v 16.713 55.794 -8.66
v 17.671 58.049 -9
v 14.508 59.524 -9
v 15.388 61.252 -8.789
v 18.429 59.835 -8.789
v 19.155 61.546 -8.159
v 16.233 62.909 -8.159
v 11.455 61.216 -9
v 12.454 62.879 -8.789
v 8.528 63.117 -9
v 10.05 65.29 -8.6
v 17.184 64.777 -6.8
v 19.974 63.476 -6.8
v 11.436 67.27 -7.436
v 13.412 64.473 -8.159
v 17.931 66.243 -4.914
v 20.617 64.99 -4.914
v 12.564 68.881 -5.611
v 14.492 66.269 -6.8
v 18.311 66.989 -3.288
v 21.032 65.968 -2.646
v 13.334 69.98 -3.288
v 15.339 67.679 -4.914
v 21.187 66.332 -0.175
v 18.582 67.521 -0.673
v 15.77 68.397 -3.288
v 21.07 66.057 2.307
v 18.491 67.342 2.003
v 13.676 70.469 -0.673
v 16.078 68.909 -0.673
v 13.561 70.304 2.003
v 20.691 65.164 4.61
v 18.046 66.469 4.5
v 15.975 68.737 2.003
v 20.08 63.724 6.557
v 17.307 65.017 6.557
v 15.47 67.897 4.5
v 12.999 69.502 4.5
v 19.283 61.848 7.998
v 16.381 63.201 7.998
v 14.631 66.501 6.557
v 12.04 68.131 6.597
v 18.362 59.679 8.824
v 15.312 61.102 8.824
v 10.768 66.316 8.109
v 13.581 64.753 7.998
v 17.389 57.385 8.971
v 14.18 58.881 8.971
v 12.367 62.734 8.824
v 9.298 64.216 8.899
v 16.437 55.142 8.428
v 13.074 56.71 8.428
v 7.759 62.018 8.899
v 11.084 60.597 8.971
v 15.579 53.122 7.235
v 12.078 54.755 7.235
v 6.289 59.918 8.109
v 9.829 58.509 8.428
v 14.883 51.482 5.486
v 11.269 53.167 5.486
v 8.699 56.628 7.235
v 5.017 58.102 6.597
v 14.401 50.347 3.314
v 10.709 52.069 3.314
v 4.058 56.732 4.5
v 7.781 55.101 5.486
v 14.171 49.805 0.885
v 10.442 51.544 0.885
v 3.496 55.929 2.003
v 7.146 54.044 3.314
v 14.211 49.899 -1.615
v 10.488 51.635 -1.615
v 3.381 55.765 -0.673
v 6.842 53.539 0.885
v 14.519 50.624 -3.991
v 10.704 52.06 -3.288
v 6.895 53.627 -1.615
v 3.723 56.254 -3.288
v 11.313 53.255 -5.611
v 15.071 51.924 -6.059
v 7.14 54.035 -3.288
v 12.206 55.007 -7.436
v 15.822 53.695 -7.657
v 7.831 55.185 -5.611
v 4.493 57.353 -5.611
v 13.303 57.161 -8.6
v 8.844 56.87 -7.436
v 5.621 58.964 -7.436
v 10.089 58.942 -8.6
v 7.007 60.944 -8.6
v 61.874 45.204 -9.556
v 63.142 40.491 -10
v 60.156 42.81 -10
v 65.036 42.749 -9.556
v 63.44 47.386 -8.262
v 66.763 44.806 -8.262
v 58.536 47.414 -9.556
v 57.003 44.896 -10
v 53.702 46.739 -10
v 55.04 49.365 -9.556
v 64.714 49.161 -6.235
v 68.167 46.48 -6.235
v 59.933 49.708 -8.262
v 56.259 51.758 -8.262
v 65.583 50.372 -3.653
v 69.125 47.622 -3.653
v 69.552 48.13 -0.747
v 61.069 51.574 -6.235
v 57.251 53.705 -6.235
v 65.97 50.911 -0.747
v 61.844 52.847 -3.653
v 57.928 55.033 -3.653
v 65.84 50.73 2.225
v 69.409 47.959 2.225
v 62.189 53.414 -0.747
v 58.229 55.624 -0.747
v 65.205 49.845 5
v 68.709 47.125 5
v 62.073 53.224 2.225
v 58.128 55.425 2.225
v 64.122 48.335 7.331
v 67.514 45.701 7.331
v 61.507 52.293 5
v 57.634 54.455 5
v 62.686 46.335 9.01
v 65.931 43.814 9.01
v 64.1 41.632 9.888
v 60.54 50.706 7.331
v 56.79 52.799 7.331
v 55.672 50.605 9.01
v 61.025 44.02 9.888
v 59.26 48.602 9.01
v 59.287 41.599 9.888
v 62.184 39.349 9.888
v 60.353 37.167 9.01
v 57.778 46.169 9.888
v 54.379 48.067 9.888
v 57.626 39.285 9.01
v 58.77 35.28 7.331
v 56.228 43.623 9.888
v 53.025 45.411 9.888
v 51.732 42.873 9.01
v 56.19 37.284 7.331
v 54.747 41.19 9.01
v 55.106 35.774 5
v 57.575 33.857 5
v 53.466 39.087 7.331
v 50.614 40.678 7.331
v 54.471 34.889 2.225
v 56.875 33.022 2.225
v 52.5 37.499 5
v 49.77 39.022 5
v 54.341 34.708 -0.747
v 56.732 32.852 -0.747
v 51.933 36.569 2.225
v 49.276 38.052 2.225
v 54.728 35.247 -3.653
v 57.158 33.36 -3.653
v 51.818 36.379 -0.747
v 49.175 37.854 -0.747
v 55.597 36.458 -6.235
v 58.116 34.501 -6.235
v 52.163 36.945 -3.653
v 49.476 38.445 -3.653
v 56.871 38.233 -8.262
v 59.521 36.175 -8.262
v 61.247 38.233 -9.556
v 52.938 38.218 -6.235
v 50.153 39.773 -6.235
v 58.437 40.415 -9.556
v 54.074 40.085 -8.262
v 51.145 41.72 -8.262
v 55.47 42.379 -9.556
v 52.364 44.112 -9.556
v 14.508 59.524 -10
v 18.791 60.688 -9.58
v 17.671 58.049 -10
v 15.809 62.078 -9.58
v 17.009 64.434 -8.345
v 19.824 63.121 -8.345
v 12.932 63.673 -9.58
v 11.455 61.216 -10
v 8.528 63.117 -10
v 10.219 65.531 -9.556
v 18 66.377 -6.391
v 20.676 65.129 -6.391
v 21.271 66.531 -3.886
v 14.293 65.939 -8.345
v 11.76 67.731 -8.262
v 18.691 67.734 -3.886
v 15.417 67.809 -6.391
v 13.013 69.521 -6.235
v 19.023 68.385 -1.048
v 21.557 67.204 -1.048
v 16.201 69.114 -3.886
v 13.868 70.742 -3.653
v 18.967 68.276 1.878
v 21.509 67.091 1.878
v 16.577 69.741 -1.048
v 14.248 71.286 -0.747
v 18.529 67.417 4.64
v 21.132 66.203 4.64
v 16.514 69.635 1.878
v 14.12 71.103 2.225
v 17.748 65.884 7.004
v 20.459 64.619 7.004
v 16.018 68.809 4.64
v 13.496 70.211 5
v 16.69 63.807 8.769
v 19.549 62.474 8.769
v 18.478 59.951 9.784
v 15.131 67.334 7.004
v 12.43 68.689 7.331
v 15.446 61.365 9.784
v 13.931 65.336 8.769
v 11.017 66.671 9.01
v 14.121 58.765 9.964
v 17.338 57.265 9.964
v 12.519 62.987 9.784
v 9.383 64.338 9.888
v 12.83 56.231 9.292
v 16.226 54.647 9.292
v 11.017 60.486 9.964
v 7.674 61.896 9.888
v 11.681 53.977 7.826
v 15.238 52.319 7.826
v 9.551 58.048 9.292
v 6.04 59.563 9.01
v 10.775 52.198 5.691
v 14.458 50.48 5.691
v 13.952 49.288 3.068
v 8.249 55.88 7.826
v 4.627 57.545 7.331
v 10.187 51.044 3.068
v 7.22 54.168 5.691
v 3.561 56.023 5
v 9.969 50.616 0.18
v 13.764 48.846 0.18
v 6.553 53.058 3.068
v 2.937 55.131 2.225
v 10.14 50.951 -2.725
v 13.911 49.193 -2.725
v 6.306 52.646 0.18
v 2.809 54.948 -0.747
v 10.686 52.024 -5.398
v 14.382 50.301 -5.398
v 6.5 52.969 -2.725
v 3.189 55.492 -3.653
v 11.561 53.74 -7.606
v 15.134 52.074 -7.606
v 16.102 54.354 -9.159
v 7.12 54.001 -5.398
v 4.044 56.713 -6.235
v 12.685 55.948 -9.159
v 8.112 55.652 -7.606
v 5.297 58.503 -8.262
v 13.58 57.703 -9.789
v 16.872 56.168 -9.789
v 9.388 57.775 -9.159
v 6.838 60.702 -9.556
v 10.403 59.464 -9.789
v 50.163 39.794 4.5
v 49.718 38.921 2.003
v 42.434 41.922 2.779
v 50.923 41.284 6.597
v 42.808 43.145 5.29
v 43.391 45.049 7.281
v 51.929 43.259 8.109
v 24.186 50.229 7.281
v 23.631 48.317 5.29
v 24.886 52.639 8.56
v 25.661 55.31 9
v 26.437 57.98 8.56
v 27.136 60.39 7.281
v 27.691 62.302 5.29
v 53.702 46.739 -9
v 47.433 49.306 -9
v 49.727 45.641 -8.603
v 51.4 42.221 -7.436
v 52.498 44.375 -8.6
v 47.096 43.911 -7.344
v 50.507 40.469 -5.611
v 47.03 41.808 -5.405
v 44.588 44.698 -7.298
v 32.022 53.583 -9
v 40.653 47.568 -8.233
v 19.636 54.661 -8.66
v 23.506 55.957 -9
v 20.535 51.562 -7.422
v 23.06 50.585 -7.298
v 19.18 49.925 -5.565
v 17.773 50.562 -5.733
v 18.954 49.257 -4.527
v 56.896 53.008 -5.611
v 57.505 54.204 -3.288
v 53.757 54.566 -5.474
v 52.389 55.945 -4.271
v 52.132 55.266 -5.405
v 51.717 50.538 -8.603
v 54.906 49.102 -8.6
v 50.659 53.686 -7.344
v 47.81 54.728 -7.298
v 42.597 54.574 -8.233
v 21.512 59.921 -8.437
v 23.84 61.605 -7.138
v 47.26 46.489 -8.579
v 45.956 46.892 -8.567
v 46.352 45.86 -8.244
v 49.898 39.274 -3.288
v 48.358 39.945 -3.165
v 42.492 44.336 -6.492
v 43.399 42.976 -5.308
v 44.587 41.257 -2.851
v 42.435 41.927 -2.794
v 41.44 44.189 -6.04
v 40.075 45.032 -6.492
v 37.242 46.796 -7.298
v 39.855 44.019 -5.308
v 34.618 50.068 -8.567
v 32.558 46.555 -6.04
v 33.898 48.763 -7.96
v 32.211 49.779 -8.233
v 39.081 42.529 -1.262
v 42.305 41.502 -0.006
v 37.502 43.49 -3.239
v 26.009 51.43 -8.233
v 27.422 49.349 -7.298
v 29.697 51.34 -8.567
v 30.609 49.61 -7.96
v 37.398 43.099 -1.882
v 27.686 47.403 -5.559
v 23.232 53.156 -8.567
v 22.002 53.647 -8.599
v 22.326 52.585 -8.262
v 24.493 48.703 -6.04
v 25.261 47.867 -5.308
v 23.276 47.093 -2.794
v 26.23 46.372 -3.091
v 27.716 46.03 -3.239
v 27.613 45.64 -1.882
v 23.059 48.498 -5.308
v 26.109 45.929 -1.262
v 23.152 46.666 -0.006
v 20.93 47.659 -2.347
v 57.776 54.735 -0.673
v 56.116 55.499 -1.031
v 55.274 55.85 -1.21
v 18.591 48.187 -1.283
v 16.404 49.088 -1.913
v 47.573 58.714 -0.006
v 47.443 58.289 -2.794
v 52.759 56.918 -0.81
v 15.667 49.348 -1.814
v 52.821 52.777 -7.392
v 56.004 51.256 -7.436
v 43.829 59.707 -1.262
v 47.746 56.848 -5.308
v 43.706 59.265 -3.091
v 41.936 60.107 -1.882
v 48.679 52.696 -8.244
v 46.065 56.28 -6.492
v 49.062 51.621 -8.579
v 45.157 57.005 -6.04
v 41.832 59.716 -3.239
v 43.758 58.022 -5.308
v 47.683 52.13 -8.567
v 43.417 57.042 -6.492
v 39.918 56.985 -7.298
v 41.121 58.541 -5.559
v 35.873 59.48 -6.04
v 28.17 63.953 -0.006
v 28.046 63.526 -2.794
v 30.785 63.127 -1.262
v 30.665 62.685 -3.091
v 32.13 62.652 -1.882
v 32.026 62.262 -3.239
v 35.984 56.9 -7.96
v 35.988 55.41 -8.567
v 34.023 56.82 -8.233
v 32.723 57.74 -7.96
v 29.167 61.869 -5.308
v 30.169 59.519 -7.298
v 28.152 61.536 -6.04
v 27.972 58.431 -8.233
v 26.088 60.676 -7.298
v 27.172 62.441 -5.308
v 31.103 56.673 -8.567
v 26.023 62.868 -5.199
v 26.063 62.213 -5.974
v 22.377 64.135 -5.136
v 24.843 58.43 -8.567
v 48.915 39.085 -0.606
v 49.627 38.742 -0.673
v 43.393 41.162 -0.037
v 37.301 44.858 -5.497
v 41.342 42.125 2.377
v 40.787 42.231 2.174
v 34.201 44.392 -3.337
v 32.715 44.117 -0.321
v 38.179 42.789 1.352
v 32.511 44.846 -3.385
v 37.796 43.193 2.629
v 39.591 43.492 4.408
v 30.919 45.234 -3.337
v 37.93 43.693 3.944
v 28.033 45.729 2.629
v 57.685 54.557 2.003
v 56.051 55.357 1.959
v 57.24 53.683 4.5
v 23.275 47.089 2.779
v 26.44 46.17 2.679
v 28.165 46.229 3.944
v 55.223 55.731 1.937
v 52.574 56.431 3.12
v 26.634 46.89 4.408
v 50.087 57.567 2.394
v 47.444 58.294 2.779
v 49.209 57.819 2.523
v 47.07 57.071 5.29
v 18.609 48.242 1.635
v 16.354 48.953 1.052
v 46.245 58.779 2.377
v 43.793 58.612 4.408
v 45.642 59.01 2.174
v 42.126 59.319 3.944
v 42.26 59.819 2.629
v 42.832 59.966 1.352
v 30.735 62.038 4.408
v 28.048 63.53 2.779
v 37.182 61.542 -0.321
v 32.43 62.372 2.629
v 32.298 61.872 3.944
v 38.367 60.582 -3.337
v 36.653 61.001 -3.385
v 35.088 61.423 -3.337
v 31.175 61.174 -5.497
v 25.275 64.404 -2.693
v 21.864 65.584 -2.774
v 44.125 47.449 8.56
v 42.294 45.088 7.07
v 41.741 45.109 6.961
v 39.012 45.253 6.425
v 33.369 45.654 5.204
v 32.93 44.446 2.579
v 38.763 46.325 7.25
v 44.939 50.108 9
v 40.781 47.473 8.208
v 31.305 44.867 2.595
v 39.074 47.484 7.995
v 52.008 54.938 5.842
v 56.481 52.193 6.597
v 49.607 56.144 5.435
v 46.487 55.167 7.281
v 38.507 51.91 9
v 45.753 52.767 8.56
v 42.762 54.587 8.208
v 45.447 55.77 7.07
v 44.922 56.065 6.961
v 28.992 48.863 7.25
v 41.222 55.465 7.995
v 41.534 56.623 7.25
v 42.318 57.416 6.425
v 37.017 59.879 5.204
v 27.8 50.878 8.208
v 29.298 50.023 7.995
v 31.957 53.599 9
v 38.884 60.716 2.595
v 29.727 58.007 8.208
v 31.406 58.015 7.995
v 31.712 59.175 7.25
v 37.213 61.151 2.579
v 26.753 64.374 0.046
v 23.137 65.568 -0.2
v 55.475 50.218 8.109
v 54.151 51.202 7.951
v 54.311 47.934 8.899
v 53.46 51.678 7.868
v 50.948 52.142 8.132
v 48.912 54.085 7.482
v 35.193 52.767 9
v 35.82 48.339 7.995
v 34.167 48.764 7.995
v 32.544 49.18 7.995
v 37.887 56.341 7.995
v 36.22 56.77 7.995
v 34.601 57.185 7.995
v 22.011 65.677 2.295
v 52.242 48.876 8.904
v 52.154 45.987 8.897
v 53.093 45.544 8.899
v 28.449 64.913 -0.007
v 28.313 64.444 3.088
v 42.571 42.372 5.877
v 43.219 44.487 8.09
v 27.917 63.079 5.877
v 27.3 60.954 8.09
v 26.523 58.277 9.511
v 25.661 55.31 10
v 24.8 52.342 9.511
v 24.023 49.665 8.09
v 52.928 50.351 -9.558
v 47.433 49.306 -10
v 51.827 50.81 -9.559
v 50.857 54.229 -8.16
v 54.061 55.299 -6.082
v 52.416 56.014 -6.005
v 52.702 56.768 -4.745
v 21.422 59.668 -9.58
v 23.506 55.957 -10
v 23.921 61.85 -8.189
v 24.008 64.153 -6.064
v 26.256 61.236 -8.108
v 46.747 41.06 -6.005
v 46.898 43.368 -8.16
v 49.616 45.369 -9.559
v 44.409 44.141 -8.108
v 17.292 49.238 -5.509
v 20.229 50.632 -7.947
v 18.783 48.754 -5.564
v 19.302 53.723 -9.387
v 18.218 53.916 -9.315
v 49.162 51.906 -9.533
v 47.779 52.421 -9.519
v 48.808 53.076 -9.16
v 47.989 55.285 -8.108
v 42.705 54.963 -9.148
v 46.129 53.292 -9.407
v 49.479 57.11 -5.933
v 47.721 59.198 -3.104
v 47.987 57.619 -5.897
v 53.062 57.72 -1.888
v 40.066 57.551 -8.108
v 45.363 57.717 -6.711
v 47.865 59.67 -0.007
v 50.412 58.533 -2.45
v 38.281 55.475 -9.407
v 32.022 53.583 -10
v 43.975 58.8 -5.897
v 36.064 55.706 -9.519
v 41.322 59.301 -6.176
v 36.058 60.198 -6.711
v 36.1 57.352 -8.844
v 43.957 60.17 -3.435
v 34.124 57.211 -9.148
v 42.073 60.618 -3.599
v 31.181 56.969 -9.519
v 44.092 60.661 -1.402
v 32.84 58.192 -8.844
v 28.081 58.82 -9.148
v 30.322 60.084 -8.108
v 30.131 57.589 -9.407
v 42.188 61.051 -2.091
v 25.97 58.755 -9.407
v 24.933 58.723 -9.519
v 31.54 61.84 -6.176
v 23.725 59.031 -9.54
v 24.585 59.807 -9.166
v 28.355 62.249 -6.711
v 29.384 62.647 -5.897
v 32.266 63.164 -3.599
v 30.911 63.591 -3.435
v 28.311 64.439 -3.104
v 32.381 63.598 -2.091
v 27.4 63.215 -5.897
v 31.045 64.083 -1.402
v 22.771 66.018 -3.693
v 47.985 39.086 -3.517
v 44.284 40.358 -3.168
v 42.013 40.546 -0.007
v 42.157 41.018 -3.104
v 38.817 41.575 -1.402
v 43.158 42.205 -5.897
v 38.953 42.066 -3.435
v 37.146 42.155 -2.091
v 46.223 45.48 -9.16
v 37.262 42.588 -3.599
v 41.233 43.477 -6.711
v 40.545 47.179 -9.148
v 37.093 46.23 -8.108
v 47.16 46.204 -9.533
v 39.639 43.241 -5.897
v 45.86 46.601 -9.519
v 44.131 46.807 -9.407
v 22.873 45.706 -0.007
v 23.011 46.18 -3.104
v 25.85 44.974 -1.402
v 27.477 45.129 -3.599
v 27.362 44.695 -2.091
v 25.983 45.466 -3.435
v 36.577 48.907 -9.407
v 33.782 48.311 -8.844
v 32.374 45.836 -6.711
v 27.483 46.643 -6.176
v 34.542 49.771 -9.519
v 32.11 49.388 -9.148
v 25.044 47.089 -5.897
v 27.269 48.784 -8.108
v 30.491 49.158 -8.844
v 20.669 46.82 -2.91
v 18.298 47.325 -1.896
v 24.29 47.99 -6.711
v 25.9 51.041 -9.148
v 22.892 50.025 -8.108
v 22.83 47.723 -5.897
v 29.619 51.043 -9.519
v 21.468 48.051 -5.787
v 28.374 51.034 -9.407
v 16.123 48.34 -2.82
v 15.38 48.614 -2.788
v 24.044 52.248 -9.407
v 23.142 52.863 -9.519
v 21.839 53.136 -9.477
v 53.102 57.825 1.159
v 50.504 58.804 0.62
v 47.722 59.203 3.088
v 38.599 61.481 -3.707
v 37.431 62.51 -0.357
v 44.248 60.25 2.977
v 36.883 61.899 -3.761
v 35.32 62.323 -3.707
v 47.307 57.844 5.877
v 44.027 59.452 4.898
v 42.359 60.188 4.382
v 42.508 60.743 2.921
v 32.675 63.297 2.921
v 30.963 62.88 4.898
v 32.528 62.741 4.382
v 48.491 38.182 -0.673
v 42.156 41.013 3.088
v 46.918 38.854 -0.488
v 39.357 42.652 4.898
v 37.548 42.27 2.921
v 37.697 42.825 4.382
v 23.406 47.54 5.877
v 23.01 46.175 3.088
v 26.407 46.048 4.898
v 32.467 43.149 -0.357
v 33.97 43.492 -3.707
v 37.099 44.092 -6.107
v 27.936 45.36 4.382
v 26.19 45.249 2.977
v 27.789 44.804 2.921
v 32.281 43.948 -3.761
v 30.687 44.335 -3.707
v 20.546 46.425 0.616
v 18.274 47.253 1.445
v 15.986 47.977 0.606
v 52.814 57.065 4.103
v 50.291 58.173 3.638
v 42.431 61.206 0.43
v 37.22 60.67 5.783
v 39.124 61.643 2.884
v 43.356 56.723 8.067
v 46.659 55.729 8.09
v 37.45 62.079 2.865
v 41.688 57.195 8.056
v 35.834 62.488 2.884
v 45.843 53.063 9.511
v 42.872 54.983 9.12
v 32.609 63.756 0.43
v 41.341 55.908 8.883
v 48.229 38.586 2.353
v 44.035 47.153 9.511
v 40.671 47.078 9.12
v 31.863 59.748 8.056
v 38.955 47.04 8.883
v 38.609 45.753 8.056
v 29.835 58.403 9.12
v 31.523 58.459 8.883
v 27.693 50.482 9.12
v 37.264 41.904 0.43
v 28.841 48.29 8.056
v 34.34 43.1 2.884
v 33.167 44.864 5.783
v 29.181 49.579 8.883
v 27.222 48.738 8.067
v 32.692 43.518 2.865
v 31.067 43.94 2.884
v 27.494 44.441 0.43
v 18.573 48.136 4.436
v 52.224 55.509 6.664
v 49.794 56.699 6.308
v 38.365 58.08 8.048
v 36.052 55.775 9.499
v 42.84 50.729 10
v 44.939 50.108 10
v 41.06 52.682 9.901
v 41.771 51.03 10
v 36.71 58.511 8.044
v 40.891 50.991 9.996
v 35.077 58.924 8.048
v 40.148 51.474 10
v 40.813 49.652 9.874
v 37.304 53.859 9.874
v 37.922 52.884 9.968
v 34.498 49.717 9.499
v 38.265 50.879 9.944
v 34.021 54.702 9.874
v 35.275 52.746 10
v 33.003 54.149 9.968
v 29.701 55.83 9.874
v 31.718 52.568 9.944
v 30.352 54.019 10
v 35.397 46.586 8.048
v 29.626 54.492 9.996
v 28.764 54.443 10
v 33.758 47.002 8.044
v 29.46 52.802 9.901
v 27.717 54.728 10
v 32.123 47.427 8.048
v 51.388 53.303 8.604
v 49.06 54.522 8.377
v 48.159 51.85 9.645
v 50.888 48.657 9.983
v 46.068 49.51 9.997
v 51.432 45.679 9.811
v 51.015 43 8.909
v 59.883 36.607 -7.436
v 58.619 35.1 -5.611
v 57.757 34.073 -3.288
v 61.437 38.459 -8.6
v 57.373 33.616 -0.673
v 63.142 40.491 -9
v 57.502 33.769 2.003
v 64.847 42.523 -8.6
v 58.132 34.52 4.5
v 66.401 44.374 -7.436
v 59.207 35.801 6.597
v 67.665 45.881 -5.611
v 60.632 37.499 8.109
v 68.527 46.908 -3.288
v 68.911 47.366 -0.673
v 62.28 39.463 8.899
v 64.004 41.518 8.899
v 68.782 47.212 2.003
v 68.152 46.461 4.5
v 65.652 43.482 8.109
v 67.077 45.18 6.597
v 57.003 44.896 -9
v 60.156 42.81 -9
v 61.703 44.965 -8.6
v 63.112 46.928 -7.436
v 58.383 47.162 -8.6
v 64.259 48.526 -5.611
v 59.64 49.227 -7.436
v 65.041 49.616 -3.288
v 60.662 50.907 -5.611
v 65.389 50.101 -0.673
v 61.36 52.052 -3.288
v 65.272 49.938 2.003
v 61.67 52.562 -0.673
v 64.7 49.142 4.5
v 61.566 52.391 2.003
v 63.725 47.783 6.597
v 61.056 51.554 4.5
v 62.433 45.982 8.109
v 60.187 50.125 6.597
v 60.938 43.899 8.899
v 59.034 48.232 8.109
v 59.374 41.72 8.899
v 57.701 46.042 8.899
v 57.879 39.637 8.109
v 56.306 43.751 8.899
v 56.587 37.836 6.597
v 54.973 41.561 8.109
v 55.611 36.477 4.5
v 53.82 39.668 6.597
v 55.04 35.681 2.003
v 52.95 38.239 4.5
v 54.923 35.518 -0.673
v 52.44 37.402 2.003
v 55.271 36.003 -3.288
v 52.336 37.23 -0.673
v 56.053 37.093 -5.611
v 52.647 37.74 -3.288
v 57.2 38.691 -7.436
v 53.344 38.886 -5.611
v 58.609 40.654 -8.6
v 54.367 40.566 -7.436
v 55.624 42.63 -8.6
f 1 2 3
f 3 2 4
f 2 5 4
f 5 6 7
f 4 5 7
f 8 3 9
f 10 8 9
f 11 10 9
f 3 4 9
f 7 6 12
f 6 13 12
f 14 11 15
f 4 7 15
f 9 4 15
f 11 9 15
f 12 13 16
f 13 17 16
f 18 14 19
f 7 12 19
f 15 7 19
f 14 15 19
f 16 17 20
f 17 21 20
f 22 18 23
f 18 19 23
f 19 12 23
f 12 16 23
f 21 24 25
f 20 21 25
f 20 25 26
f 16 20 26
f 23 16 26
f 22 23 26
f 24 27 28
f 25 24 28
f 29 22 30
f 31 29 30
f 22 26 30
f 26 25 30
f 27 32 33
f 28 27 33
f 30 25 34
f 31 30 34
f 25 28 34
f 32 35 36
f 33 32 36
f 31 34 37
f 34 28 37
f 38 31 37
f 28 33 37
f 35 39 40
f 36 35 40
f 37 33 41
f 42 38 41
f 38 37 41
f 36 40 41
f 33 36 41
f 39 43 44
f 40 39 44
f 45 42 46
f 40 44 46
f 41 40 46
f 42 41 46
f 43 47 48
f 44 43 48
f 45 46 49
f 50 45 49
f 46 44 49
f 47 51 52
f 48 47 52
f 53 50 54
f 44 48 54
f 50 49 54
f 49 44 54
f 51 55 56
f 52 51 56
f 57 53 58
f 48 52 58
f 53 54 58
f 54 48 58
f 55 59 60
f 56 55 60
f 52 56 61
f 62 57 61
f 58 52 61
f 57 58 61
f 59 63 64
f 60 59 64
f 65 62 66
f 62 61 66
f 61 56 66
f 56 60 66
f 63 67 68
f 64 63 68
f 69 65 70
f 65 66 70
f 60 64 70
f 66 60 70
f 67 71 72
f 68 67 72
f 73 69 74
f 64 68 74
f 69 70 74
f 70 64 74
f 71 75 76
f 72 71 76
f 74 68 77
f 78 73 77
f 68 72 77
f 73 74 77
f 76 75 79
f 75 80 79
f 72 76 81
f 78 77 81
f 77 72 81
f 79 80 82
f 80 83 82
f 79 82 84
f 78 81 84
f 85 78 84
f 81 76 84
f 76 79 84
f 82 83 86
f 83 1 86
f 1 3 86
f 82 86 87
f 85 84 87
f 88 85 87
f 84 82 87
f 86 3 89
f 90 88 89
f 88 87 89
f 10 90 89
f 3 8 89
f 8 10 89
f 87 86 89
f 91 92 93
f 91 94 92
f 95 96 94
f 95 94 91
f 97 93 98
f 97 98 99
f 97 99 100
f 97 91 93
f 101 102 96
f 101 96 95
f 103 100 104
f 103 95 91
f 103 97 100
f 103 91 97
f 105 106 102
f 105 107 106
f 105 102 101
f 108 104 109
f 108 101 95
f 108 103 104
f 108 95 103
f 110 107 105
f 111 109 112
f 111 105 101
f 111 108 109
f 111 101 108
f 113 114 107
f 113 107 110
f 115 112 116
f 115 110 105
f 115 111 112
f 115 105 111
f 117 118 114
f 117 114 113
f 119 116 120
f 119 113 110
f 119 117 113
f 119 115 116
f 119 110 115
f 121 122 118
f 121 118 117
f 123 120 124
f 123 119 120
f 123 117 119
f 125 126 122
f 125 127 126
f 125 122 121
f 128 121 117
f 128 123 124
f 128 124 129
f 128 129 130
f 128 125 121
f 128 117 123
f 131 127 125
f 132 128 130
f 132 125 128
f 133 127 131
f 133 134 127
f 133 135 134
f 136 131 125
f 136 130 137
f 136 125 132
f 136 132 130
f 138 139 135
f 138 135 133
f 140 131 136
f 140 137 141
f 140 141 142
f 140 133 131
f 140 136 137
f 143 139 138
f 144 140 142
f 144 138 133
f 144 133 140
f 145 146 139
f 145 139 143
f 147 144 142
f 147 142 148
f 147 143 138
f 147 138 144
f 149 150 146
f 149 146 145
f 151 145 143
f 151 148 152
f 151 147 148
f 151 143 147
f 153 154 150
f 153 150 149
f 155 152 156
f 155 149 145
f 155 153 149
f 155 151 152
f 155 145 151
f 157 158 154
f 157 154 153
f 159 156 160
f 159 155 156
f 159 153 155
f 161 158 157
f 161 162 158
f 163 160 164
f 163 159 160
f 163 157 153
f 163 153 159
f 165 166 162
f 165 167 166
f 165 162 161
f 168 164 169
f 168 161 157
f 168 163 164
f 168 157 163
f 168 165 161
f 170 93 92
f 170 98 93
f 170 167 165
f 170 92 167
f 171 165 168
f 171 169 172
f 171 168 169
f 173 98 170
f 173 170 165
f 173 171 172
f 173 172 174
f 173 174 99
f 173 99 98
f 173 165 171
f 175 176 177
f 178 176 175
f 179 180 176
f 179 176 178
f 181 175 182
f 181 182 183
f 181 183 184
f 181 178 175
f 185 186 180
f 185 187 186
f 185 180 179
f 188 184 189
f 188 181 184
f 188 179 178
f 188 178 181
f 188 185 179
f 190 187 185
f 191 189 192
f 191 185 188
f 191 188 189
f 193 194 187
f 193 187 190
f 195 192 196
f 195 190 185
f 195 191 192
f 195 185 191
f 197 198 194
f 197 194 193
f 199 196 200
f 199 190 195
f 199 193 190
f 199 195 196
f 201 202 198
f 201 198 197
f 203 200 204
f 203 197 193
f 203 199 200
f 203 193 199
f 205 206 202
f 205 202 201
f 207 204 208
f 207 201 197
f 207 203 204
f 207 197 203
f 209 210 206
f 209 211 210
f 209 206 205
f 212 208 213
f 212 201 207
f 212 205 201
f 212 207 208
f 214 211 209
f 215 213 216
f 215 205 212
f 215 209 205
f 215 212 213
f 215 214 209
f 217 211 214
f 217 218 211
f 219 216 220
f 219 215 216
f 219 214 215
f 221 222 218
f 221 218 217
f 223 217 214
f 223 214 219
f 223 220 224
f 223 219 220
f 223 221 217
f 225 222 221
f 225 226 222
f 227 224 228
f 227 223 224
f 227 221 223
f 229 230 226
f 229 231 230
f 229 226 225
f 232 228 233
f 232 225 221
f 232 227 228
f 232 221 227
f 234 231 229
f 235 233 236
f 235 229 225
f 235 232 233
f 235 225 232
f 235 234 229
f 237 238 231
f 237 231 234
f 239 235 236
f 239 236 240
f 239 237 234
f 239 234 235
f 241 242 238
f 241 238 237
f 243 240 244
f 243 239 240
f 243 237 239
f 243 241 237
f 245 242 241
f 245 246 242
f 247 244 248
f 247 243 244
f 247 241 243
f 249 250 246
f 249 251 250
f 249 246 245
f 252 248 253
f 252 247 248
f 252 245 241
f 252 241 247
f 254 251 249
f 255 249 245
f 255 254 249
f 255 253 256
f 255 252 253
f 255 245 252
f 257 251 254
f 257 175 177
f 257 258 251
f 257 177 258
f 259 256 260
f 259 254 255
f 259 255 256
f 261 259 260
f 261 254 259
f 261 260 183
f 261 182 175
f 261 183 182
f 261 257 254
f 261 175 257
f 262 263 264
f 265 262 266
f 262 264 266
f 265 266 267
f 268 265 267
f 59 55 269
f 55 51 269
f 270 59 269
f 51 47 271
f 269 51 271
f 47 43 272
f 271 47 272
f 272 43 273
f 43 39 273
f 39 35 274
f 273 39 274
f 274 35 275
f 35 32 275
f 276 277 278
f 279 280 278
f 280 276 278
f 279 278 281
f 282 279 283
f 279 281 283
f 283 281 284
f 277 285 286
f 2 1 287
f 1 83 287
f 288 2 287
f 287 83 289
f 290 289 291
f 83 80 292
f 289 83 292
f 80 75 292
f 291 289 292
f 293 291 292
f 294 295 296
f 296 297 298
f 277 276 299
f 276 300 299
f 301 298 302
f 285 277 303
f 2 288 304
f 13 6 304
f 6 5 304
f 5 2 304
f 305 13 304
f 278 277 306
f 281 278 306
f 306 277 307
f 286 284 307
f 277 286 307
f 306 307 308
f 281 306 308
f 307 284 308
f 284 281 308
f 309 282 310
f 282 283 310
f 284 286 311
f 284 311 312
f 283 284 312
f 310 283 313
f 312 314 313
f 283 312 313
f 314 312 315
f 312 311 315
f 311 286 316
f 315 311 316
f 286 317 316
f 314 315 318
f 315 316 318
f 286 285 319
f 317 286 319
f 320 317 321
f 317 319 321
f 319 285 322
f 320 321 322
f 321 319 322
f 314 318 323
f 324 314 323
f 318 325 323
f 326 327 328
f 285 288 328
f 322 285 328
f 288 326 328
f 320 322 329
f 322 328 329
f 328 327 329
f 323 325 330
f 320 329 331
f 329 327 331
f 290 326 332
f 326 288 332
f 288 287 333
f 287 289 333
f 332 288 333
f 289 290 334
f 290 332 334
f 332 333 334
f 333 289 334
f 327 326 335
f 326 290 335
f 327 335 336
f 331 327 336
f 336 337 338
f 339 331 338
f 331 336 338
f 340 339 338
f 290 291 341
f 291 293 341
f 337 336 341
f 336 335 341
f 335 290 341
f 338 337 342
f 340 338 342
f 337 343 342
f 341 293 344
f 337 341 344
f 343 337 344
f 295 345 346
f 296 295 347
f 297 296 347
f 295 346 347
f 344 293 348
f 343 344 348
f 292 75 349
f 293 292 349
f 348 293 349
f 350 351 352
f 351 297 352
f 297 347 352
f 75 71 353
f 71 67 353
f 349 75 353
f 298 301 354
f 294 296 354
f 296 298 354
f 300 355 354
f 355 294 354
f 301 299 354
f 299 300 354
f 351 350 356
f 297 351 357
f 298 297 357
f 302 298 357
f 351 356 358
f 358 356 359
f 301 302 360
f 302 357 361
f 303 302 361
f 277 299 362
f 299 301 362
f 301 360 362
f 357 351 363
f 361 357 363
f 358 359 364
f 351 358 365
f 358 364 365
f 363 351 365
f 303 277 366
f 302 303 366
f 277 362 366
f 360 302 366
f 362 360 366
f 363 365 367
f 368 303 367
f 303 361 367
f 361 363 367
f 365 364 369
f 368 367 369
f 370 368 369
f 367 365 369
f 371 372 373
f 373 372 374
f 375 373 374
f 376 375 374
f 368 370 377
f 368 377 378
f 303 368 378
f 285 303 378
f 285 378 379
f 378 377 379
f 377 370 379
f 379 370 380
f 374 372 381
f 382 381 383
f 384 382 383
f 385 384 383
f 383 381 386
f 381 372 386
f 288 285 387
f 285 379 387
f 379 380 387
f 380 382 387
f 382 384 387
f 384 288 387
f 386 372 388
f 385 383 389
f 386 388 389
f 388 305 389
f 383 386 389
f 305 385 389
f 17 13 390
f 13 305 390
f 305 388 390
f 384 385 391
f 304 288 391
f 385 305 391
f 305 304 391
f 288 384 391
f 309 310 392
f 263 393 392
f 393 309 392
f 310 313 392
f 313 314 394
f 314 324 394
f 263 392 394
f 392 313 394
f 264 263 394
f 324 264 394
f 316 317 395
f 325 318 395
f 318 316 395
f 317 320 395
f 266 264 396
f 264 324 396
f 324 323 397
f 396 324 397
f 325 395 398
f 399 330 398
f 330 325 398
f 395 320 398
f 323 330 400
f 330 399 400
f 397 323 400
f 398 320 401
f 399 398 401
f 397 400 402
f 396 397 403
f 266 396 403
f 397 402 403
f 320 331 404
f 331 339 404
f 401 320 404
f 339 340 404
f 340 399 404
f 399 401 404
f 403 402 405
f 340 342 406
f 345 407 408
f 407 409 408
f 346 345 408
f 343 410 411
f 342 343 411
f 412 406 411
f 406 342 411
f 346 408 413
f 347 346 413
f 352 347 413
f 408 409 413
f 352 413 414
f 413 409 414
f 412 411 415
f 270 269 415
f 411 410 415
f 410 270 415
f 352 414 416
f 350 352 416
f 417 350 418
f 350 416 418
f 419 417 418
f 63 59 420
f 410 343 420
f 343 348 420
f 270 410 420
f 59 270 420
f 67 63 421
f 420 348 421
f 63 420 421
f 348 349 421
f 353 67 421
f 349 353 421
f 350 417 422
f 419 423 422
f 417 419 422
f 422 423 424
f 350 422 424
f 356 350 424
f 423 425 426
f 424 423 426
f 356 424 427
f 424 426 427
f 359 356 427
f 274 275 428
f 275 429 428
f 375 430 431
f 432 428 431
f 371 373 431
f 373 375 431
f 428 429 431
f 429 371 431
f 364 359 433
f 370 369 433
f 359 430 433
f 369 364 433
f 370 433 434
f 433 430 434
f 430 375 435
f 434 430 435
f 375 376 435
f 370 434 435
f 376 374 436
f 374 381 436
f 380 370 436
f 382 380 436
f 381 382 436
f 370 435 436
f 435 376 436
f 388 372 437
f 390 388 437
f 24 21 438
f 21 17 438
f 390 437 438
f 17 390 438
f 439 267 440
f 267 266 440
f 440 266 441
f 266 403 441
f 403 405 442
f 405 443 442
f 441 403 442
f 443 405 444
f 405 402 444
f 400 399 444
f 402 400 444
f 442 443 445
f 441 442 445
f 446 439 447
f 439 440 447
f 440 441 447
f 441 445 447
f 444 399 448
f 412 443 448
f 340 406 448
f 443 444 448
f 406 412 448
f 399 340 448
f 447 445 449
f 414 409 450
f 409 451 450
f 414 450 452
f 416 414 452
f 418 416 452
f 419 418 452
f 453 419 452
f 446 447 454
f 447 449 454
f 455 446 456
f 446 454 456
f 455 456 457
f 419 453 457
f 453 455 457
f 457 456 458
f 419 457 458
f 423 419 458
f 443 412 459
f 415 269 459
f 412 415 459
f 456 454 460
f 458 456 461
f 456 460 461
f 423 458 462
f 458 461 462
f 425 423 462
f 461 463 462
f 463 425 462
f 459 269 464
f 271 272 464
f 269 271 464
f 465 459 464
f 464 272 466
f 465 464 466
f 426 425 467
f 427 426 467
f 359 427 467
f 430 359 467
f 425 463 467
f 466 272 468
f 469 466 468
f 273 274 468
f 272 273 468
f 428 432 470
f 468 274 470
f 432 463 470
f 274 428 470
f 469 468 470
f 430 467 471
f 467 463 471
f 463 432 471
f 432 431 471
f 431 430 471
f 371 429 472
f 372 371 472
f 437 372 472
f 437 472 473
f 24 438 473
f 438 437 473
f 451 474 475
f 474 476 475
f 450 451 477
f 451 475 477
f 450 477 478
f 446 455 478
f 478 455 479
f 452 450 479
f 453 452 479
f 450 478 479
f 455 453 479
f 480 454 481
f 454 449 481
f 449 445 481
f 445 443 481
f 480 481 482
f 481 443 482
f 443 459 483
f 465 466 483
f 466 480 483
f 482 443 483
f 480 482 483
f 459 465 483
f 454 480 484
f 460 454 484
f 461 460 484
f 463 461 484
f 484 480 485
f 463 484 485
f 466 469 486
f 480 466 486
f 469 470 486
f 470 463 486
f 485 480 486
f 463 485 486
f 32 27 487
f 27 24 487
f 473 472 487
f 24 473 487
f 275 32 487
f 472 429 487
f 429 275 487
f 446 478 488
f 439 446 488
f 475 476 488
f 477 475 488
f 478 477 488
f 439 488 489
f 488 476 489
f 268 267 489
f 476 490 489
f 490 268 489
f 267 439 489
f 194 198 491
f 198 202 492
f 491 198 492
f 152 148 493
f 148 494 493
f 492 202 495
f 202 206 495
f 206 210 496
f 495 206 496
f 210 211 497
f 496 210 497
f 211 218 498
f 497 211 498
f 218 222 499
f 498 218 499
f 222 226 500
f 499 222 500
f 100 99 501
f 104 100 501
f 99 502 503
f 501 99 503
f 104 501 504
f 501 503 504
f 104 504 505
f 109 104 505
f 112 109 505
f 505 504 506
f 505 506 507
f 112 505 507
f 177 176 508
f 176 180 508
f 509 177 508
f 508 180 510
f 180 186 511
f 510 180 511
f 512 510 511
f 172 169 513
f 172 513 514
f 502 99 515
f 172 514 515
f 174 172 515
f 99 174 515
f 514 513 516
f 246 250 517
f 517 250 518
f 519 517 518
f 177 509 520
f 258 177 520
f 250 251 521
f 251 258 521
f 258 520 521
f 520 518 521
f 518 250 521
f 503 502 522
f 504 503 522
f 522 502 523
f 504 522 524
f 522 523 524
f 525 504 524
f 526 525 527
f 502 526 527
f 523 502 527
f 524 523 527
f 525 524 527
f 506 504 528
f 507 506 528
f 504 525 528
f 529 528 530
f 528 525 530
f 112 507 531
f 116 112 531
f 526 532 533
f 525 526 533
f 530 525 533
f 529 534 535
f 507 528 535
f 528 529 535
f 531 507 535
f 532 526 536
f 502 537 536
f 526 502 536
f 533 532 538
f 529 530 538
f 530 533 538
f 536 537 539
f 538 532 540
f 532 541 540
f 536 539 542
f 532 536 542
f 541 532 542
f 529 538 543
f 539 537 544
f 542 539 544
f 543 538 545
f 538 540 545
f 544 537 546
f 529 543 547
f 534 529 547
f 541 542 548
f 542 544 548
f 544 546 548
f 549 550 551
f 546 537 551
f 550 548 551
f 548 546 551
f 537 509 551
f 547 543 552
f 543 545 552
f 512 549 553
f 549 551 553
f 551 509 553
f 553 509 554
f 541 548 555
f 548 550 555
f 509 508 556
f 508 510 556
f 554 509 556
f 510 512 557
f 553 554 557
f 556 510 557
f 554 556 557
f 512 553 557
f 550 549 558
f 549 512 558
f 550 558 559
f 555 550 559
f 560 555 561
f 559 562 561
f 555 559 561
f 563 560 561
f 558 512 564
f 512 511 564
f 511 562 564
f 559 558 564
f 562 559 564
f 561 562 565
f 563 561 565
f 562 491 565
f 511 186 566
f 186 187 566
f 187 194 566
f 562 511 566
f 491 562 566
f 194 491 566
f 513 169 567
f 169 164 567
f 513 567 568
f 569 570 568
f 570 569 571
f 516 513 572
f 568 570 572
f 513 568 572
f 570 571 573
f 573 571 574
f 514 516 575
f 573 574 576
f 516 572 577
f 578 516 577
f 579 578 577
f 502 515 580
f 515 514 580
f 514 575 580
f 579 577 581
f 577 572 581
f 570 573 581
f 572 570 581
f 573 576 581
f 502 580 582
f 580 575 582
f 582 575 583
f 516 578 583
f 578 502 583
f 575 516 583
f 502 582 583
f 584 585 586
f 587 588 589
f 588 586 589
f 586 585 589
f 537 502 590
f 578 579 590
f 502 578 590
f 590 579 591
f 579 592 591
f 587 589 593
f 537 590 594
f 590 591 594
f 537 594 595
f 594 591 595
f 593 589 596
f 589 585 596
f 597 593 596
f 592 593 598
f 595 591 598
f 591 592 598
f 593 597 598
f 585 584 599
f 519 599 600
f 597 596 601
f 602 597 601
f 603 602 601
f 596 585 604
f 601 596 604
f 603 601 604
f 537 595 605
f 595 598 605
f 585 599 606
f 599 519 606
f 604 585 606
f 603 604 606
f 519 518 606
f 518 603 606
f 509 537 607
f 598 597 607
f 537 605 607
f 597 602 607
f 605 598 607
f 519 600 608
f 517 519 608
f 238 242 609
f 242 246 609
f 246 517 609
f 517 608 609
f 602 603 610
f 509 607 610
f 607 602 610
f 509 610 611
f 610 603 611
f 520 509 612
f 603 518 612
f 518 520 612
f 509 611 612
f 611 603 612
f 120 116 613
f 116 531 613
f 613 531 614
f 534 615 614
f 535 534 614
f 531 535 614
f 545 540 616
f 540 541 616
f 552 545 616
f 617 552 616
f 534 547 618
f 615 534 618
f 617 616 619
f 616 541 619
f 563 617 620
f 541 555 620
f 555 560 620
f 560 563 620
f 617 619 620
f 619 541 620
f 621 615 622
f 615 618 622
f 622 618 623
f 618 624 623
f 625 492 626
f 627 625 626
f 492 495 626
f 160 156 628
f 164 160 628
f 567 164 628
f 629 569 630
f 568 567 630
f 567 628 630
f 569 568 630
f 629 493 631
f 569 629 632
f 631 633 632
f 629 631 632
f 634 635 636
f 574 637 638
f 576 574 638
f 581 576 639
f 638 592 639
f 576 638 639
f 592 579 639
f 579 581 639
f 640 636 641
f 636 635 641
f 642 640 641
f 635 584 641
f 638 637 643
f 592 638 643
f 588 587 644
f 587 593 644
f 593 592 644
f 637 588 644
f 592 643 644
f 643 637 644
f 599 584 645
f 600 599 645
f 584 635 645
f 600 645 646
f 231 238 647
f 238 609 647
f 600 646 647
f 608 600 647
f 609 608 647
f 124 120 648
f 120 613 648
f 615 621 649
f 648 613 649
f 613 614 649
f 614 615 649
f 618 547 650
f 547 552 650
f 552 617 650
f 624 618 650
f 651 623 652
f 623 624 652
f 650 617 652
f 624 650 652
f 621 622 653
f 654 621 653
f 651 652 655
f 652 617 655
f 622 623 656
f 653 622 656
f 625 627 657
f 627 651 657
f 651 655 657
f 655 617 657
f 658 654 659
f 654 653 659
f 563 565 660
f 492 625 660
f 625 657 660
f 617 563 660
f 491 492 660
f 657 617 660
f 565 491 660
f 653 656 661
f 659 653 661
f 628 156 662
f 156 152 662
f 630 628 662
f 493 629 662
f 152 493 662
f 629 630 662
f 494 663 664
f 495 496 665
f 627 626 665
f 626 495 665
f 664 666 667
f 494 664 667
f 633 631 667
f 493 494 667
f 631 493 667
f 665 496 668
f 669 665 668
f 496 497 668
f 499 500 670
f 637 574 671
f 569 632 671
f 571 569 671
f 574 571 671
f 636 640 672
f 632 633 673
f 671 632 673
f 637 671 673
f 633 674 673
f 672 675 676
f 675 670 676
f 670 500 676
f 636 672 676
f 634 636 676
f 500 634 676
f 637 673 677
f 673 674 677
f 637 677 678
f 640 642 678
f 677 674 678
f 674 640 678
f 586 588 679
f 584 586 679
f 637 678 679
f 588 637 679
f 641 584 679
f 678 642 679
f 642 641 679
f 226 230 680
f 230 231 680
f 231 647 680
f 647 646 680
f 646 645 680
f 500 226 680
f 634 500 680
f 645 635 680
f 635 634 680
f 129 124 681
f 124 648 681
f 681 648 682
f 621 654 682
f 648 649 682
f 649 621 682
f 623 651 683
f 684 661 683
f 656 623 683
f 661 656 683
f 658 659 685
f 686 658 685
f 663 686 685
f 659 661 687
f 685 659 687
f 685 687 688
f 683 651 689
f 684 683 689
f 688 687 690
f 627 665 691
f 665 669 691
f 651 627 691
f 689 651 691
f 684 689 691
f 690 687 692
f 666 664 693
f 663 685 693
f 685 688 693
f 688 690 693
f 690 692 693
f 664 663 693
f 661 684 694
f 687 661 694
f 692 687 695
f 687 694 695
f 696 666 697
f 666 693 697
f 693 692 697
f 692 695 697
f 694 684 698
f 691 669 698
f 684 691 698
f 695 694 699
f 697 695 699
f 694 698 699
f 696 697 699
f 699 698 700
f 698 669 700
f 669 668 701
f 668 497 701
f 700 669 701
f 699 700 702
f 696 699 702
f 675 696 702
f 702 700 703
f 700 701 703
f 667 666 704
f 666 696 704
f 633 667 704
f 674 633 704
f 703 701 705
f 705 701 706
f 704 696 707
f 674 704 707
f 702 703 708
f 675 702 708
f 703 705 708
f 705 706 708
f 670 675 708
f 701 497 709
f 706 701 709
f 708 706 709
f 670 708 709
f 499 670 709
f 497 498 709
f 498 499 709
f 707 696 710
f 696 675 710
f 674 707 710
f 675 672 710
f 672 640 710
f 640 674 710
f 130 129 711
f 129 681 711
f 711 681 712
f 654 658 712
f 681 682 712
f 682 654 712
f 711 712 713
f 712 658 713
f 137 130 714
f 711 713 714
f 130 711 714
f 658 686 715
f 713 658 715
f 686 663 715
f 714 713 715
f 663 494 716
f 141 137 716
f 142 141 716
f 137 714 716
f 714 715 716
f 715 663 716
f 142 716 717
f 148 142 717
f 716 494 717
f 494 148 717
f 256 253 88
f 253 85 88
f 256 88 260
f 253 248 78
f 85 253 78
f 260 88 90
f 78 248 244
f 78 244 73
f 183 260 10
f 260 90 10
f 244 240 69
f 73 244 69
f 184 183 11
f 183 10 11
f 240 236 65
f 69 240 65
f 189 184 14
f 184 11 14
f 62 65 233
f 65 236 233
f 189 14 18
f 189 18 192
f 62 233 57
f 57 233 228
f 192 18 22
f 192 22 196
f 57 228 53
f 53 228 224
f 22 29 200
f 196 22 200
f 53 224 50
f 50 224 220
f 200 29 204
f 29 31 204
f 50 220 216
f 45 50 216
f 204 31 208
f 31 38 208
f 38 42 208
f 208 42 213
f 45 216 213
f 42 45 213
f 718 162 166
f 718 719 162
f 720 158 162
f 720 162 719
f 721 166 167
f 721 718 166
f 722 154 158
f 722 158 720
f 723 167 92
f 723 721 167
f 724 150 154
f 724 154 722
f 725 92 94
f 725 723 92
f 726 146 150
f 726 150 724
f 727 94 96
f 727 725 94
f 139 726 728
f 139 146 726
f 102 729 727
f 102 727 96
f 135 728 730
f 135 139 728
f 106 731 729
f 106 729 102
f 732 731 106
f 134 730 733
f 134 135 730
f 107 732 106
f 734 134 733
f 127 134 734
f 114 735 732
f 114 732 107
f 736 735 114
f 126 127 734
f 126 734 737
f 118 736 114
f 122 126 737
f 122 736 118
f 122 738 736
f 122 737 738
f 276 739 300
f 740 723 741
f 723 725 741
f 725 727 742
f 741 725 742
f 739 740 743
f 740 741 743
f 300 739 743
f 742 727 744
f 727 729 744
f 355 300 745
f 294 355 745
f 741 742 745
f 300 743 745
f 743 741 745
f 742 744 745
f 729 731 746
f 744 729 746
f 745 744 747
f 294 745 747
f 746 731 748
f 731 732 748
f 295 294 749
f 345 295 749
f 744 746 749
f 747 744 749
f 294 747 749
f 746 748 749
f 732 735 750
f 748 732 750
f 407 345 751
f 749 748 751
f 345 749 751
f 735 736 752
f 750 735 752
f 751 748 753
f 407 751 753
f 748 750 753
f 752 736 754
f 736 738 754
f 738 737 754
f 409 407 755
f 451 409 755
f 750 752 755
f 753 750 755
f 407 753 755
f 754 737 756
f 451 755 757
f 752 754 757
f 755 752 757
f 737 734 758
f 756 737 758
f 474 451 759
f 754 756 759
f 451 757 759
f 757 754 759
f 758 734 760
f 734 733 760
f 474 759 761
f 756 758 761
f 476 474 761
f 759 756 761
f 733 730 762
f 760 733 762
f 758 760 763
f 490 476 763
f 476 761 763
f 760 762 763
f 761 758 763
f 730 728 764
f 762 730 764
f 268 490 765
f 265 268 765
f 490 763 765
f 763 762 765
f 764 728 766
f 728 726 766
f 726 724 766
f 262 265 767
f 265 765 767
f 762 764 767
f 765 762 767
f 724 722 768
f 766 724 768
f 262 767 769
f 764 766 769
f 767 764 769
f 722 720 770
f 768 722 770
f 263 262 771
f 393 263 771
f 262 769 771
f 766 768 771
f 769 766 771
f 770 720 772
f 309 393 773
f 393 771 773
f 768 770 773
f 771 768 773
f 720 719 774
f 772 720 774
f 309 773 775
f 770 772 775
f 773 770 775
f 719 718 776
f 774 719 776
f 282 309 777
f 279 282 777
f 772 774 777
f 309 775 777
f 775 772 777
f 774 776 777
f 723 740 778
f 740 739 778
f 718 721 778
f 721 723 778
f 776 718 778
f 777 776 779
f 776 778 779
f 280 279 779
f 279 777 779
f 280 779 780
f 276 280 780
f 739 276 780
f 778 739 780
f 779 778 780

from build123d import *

# Parameters (mm, degrees)
SKETCH_2_R   = 10
SKETCH_2_R_2 = 9


with BuildPart() as part:
    # 扫描1: sweep along a path in 草图1
    with BuildLine() as sweep_1_path:  # in the path sketch's own coordinates; laid on its plane below (add() does not lay a ready-made edge on the line's plane)
        ThreePointArc((63.141814145, 40.490666647), (58.599282927, 43.882735594), (53.701958648, 46.7387707))
        add(Edge.make_bspline(
            [(53.701958648, 46.7387707), (48.603839303, 49.336392251), (35.429712495, 52.699485328), (22.337212866, 56.068517029), (17.670736666, 58.049318656)],
            knots=[0, 0, 0, 0, 0.529673669, 1, 1, 1, 1], degree=3))
        ThreePointArc((17.670736666, 58.049318656), (12.966812078, 60.343575972), (8.528471273, 63.116959114))
    # 草图2 → 扫描1 (sweep)
    with BuildSketch(Plane(origin=(8.528471273, 63.116959114, 0), x_dir=(0, 0, -1), z_dir=(0.819152044288993, -0.5735764363510444, 0))):
        Circle(SKETCH_2_R)
        Circle(SKETCH_2_R_2, mode=Mode.SUBTRACT)
    sweep(path=Plane.XY * sweep_1_path.line)


solid = part.part
